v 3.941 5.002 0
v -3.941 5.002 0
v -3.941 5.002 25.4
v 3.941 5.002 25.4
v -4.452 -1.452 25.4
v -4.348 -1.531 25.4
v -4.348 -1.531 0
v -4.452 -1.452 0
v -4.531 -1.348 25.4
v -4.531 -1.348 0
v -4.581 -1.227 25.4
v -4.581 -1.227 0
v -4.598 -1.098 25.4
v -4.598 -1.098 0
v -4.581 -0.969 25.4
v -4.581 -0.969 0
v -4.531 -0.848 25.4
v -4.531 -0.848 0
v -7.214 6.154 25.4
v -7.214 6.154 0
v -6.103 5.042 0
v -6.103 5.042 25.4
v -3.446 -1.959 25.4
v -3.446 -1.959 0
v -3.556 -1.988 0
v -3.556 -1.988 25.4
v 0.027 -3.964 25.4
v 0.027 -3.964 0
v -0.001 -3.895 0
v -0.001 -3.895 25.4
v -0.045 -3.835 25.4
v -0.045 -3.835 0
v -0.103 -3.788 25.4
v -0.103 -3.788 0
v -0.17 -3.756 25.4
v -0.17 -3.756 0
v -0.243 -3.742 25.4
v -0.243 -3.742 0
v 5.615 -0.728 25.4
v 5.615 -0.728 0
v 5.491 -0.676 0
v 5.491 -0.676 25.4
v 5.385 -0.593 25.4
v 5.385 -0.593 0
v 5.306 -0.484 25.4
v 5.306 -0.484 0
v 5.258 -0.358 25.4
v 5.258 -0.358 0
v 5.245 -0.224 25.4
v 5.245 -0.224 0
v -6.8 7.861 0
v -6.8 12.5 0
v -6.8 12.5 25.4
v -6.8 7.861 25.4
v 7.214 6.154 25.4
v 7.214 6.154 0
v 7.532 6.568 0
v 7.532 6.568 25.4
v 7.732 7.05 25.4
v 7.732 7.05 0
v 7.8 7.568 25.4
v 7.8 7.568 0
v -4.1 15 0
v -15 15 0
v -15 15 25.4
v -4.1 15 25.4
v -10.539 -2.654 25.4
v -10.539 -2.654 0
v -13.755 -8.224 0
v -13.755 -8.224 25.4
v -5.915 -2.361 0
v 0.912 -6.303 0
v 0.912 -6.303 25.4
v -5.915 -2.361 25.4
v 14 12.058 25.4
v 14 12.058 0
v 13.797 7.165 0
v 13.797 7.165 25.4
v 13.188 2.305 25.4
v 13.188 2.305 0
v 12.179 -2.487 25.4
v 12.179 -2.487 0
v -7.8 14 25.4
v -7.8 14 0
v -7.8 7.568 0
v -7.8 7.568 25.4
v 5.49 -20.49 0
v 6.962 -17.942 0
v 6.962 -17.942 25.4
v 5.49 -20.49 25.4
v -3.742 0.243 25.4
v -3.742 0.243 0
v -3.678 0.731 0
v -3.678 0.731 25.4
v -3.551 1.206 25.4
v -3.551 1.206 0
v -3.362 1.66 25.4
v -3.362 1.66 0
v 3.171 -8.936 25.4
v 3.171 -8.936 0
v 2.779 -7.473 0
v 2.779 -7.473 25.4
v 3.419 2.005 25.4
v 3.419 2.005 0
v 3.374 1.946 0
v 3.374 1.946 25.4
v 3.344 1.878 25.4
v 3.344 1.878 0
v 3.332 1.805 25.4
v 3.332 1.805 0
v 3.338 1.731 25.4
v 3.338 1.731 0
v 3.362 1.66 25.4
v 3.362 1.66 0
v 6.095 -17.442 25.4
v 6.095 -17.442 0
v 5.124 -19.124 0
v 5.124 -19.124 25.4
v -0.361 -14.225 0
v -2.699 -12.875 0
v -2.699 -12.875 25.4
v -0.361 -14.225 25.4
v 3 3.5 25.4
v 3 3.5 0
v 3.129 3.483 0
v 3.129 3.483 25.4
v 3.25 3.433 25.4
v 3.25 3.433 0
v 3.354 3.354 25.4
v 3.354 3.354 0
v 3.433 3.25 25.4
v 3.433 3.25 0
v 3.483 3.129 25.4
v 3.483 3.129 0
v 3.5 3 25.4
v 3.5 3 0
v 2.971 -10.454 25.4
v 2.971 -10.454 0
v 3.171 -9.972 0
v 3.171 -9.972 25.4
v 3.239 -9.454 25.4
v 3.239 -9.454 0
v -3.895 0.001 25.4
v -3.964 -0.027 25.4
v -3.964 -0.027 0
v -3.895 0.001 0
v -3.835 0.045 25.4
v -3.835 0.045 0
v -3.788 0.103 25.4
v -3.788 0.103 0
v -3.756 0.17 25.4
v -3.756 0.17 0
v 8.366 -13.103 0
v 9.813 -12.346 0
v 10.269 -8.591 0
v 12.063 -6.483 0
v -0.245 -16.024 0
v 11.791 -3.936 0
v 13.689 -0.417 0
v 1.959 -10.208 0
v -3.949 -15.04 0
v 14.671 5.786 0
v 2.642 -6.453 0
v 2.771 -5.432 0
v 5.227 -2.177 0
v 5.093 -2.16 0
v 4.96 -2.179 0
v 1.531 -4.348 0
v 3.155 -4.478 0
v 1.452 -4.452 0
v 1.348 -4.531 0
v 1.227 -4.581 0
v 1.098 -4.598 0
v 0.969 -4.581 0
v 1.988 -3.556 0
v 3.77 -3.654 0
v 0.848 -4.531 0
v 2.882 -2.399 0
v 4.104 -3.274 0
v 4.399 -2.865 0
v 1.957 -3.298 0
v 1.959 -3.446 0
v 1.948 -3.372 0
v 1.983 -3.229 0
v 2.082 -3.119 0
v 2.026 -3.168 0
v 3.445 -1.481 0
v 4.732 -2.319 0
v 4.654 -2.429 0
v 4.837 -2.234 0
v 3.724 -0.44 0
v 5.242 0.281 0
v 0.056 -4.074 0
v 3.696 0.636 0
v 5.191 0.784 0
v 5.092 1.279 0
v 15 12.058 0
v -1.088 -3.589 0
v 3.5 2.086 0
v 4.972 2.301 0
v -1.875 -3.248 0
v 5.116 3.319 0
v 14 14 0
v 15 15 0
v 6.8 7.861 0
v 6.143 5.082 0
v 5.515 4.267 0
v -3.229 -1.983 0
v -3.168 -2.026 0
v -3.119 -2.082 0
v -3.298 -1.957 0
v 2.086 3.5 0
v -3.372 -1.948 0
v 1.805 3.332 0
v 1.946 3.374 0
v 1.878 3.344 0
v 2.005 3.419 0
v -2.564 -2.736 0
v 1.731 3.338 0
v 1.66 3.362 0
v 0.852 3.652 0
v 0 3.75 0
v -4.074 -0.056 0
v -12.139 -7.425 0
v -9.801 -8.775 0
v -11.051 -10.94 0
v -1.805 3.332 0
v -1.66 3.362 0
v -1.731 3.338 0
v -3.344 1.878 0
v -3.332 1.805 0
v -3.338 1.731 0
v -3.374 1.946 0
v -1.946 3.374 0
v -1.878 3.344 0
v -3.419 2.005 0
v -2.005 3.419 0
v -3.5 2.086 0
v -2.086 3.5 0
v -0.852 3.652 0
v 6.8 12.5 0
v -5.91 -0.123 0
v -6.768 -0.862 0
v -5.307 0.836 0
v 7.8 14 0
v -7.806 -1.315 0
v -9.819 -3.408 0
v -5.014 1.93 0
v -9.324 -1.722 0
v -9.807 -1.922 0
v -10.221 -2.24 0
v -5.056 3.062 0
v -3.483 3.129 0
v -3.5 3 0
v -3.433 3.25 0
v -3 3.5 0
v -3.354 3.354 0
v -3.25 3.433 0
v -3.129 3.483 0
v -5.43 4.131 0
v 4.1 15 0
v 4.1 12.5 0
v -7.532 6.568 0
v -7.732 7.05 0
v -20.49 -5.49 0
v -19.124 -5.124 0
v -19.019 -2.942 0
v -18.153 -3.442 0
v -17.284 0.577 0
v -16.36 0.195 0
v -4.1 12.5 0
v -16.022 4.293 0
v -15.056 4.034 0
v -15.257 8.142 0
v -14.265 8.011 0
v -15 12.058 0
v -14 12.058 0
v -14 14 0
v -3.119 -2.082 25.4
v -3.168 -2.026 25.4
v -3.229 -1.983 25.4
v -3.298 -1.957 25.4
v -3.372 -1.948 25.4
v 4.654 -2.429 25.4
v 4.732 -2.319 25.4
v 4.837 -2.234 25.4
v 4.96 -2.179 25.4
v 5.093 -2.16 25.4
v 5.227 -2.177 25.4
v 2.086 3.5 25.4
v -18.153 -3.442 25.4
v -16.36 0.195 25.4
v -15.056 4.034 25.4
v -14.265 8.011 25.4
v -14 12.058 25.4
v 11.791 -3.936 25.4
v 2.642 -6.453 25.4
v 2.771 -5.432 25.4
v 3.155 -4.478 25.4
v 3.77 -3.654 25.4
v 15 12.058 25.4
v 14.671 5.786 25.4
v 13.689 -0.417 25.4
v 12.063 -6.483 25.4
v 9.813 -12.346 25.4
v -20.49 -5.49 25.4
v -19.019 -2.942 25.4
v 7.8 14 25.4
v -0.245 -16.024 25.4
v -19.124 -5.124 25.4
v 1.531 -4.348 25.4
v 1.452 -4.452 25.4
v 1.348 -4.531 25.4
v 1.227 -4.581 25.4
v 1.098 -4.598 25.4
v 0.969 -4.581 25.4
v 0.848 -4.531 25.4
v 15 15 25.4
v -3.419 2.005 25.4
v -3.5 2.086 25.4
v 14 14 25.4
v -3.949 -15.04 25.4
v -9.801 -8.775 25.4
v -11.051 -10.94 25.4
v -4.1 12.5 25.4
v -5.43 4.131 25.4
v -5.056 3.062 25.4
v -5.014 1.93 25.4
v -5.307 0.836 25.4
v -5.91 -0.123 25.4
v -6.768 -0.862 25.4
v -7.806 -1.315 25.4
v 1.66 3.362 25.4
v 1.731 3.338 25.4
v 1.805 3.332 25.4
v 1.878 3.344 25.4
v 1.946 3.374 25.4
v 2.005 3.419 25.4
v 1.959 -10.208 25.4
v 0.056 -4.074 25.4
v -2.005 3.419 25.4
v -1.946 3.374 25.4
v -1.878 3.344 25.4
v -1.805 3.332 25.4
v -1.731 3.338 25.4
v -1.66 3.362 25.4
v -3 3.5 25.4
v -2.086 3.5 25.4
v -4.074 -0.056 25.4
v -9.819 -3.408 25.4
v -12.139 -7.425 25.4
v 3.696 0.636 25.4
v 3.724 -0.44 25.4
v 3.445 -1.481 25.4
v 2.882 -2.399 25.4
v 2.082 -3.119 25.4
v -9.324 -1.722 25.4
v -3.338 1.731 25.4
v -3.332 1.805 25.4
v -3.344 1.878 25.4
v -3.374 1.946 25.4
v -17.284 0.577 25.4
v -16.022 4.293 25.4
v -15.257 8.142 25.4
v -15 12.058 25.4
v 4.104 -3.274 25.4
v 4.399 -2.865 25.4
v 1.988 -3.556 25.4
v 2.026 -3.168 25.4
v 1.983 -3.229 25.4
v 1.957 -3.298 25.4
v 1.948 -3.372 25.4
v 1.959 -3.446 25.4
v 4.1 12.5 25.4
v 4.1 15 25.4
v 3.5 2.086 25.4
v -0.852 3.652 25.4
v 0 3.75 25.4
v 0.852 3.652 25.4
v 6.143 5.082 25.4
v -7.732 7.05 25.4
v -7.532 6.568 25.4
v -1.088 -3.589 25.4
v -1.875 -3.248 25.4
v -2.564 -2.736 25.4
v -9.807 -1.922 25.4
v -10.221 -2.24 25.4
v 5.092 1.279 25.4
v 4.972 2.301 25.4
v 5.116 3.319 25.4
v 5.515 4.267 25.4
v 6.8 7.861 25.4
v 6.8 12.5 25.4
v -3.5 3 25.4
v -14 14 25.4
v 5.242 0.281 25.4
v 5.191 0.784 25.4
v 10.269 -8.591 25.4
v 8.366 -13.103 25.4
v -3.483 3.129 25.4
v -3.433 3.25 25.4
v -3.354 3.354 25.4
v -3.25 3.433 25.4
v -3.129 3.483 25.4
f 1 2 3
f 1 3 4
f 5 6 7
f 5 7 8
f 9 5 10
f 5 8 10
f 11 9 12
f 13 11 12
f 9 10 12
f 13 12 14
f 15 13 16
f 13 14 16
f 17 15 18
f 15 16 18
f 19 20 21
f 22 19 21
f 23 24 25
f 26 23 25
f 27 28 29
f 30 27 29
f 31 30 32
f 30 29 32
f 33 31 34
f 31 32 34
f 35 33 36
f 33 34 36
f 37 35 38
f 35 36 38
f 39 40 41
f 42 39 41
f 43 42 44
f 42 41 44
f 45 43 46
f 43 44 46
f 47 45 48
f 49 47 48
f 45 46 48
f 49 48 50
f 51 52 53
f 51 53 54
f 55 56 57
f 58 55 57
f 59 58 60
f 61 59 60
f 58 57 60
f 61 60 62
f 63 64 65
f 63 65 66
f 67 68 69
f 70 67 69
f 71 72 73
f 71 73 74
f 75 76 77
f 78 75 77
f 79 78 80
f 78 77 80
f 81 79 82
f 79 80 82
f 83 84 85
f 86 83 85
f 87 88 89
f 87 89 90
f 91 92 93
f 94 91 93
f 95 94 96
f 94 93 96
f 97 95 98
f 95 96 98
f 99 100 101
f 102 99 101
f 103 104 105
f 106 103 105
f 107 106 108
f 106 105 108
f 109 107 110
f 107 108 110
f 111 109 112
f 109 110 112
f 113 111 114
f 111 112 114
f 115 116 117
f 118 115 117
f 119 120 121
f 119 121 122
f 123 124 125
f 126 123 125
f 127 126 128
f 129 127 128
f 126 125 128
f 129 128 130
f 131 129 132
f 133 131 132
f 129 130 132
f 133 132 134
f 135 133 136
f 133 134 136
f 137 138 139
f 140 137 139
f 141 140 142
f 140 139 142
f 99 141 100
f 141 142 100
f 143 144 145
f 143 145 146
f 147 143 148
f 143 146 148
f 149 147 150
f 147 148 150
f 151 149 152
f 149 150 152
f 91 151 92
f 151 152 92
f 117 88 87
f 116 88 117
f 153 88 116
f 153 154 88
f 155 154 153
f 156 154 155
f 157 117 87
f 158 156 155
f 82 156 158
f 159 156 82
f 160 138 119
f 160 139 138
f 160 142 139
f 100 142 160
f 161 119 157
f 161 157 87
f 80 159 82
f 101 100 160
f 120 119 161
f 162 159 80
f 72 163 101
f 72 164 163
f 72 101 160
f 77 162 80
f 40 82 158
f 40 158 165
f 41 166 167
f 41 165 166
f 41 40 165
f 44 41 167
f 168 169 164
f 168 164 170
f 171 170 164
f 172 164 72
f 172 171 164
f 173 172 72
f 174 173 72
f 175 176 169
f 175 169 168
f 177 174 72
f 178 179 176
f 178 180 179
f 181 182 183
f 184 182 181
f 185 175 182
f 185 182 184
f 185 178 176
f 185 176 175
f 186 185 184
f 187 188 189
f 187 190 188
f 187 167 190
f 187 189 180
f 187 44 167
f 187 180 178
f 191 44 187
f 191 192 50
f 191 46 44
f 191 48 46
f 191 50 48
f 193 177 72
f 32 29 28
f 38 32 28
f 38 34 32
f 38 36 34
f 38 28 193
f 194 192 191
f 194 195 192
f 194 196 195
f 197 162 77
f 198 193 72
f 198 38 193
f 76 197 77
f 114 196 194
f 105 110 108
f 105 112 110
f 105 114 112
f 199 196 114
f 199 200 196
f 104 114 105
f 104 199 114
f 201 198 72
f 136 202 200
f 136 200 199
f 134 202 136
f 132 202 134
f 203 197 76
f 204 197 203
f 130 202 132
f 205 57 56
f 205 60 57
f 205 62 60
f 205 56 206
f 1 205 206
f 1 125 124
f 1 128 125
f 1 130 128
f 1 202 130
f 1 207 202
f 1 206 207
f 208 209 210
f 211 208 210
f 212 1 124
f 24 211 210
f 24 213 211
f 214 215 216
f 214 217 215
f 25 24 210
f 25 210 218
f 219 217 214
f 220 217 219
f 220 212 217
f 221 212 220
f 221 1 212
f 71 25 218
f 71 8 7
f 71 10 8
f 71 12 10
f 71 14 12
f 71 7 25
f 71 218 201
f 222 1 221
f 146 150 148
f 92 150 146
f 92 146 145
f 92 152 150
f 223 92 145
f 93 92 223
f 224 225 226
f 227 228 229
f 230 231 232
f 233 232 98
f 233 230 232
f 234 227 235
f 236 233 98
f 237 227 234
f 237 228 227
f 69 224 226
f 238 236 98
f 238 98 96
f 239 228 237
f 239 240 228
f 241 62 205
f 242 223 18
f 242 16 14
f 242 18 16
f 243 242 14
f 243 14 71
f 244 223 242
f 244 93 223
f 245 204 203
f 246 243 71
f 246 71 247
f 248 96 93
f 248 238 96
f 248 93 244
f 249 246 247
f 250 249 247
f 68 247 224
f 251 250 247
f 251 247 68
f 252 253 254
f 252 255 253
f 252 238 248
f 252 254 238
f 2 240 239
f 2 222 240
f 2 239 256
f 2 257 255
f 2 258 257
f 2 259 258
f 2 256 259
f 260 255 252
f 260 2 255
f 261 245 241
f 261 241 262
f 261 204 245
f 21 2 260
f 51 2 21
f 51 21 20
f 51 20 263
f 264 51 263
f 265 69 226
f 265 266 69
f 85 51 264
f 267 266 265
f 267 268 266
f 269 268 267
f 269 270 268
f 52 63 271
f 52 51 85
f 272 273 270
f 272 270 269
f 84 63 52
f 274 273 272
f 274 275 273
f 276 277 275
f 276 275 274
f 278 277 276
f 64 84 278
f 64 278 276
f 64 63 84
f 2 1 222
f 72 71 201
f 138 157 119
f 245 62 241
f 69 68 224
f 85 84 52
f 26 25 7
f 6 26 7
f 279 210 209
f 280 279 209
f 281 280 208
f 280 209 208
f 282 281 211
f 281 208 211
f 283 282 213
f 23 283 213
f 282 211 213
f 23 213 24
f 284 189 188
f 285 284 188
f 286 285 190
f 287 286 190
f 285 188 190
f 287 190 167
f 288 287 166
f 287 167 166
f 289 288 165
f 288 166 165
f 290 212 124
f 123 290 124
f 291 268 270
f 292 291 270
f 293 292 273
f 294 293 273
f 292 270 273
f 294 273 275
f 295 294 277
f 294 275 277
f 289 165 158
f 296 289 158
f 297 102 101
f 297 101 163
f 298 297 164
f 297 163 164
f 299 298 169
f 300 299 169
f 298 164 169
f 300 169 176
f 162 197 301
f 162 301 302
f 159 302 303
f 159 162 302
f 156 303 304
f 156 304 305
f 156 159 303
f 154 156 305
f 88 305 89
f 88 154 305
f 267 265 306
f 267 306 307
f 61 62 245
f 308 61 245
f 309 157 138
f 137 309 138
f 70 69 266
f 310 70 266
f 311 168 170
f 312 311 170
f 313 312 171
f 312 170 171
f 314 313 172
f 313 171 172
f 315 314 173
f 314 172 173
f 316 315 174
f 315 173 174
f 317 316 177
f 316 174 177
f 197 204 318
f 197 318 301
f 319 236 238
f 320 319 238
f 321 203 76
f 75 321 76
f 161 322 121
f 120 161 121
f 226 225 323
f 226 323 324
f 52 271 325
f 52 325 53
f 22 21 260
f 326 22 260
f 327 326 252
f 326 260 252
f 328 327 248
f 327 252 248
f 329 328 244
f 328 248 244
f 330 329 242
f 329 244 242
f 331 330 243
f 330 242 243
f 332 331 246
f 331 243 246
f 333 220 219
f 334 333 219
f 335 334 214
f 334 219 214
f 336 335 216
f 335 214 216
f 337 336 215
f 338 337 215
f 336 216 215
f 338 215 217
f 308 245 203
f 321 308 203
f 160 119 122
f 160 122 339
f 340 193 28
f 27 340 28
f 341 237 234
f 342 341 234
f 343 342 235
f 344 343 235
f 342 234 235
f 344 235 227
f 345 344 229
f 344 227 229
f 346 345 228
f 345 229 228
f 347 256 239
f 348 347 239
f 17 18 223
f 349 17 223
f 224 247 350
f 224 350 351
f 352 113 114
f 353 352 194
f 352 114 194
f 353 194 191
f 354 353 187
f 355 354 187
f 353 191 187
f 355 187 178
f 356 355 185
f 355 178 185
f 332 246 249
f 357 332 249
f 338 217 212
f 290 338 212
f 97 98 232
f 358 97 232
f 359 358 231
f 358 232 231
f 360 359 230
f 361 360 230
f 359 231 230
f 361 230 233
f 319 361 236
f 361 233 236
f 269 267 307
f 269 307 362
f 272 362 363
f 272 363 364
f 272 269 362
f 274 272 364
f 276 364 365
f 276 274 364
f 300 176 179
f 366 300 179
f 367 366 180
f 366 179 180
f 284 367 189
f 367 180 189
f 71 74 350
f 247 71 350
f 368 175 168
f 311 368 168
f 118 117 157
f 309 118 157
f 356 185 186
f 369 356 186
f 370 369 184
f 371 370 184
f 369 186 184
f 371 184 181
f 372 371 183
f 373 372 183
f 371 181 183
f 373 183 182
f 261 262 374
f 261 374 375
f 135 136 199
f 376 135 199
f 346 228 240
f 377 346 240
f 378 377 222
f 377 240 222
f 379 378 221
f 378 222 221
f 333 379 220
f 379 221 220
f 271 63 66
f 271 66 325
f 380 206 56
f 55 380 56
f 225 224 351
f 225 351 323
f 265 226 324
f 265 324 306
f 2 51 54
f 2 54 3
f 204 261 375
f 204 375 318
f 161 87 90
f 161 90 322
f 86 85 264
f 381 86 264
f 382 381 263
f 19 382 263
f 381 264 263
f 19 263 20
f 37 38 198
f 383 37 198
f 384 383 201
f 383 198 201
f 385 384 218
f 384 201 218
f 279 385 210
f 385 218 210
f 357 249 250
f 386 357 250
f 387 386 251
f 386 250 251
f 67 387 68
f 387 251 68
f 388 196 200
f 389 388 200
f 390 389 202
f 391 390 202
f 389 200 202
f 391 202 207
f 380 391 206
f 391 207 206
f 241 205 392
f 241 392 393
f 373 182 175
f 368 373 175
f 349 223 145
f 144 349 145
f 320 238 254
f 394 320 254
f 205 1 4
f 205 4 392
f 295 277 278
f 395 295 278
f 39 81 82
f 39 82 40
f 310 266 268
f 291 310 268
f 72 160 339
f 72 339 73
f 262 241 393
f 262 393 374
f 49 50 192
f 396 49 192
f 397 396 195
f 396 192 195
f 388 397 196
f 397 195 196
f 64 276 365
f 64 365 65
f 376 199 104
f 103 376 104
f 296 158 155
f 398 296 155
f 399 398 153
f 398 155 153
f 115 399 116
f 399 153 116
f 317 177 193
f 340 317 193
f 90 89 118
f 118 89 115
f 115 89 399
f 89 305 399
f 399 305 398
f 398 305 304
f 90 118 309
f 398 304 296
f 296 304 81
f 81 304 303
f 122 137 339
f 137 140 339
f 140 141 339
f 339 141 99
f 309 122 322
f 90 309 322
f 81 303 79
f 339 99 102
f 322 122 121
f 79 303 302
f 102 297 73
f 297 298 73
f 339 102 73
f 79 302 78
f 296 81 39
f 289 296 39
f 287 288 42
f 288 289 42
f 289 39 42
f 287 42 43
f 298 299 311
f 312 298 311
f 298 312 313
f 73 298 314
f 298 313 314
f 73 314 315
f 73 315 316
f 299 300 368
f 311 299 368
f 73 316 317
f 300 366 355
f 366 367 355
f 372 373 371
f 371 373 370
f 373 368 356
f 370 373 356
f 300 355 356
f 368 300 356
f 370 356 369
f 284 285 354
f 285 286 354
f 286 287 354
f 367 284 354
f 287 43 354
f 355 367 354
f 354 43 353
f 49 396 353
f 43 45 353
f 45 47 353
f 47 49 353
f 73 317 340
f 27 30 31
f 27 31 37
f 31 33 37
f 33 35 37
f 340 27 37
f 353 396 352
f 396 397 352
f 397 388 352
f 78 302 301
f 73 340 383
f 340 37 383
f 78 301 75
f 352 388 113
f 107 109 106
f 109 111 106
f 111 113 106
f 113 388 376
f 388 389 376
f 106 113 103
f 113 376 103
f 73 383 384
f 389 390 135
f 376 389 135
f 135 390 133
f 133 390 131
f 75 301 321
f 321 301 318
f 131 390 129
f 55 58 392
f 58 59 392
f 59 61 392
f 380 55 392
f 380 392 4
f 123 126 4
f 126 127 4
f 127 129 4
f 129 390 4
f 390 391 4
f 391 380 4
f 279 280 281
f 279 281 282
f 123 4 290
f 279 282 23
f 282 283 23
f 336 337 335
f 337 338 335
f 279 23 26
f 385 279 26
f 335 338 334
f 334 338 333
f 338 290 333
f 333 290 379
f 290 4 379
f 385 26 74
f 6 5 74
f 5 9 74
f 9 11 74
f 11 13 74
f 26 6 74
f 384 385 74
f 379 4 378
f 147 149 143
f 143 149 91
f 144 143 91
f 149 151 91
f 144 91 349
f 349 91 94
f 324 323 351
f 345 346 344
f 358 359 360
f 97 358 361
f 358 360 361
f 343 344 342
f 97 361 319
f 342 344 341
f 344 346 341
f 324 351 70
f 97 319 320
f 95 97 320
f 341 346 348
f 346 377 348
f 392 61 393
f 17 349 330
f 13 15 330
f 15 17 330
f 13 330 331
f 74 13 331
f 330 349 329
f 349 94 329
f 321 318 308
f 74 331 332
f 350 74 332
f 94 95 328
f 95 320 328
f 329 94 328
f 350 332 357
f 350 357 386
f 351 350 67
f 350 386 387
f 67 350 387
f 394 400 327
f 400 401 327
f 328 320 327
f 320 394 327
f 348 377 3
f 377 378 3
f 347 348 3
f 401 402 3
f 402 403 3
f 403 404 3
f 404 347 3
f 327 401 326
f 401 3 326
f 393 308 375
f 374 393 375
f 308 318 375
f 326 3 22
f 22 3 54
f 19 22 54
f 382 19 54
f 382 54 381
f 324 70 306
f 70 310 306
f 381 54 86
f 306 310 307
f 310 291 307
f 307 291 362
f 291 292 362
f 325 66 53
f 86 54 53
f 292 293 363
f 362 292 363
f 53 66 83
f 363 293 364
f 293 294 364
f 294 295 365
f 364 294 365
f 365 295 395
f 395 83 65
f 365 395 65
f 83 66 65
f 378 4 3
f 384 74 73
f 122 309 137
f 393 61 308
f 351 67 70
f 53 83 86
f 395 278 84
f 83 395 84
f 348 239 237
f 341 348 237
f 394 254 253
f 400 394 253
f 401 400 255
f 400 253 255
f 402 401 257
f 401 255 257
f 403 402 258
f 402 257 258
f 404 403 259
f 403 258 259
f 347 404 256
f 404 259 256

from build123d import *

# Parameters (mm, degrees)
EXTRUSION4_DEPTH = 25.4


with BuildPart() as part:
    # Sketch1 → Extrusion4 (new body)
    with BuildSketch(Plane.XY):
        with BuildLine():
            Line((-14.999999544, 15.00000004), (-4.099998054, 15.00000004))
            Line((-4.099998054, 15.00000004), (-4.099998054, 12.50000004))
            Line((-4.099998054, 12.50000004), (-6.799995004, 12.50000004))
            Line((-6.799995004, 12.50000004), (-6.799995004, 7.86065564))
            Line((-6.799995004, 7.86065564), (-3.941497574, 5.00215821))
            Line((-3.941497574, 5.00215821), (3.941498416, 5.00215821))
            Line((3.941498416, 5.00215821), (6.799995846, 7.86065564))
            Line((6.799995846, 7.86065564), (6.799995846, 12.50000004))
            Line((6.799995846, 12.50000004), (4.099998896, 12.50000004))
            Line((4.099998896, 12.50000004), (4.099998896, 15.00000004))
            Line((4.099998896, 15.00000004), (15.000000416, 15.00000004))
            Line((15.000000416, 15.00000004), (15.000000416, 12.05771371))
            ThreePointArc((15.000000416, 12.05771371), (12.955549997, -3.471428997), (6.961524646, -17.94228629))
            Line((6.961524646, -17.94228629), (5.490381513, -20.490381017))
            Line((5.490381513, -20.490381017), (-3.949296731, -15.040380238))
            Line((-3.949296731, -15.040380238), (-2.699296736, -12.875316731))
            Line((-2.699296736, -12.875316731), (-0.361030787, -14.225315201))
            Line((-0.361030787, -14.225315201), (1.958641406, -10.2075251))
            Line((1.958641406, -10.2075251), (0.912358736, -6.302745))
            Line((0.912358736, -6.302745), (-5.914516044, -2.36124701))
            Line((-5.914516044, -2.36124701), (-9.819296144, -3.40752968))
            Line((-9.819296144, -3.40752968), (-12.138968342, -7.425319789))
            Line((-12.138968342, -7.425319789), (-9.800702394, -8.775318258))
            Line((-9.800702394, -8.775318258), (-11.050702387, -10.940381761))
            Line((-11.050702387, -10.940381761), (-20.490380619, -5.490380991))
            Line((-20.490380619, -5.490380991), (-19.019237434, -2.94228629))
            ThreePointArc((-19.019237434, -2.94228629), (-16.022224761, 4.293142357), (-14.999999544, 12.05771371))
            Line((-14.999999544, 12.05771371), (-14.999999544, 15.00000004))
        make_face()
        with BuildLine():
            Line((-3.499999544, 2.08578648), (-3.499999544, 3.00000004))
            ThreePointArc((-3.499999544, 3.00000004), (-3.353552934, 3.35355343), (-2.999999544, 3.50000004))
            Line((-2.999999544, 3.50000004), (-2.085785994, 3.50000006))
            Line((-2.085785994, 3.50000006), (-2.005133554, 3.41934762))
            ThreePointArc((-2.005133554, 3.41934762), (-1.841799553, 3.33547501), (-1.660186564, 3.36248117))
            ThreePointArc((-1.660186564, 3.36248117), (4.31e-07, 3.75000007), (1.660187426, 3.36248117))
            ThreePointArc((1.660187426, 3.36248117), (1.841800416, 3.33547501), (2.005134416, 3.41934762))
            Line((2.005134416, 3.41934762), (2.085786856, 3.50000006))
            Line((2.085786856, 3.50000006), (3.000000416, 3.50000006))
            ThreePointArc((3.000000416, 3.50000006), (3.353553806, 3.35355345), (3.500000416, 3.00000006))
            Line((3.500000416, 3.00000006), (3.500000416, 2.0857865))
            Line((3.500000416, 2.0857865), (3.419347976, 2.00513406))
            ThreePointArc((3.419347976, 2.00513406), (3.335475366, 1.841800059), (3.362481526, 1.66018707))
            ThreePointArc((3.362481526, 1.66018707), (3.622222275, -0.970571346), (2.081900986, -3.11900459))
            ThreePointArc((2.081900986, -3.11900459), (1.967706477, -3.262782979), (1.958675286, -3.44617068))
            Line((1.958675286, -3.44617068), (1.988196126, -3.55634396))
            Line((1.988196126, -3.55634396), (1.531089346, -4.34807613))
            ThreePointArc((1.531089346, -4.34807613), (1.227486167, -4.58103904), (0.848076646, -4.53108883))
            Line((0.848076646, -4.53108883), (0.056344476, -4.07398205))
            Line((0.056344476, -4.07398205), (0.026823636, -3.96380877))
            ThreePointArc((0.026823636, -3.96380877), (-0.072691445, -3.809505949), (-0.243475994, -3.74208748))
            ThreePointArc((-0.243475994, -3.74208748), (-1.874999553, -3.247595194), (-3.119004214, -2.08190049))
            ThreePointArc((-3.119004214, -2.08190049), (-3.262782603, -1.967705981), (-3.446170304, -1.95867479))
            Line((-3.446170304, -1.95867479), (-3.556343584, -1.98819563))
            Line((-3.556343584, -1.98819563), (-4.348075754, -1.53108885))
            ThreePointArc((-4.348075754, -1.53108885), (-4.581038663, -1.227485671), (-4.531088454, -0.84807615))
            Line((-4.531088454, -0.84807615), (-4.073981674, -0.05634398))
            Line((-4.073981674, -0.05634398), (-3.963808394, -0.02682314))
            ThreePointArc((-3.963808394, -0.02682314), (-3.809505572, 0.072691941), (-3.742087104, 0.24347649))
            ThreePointArc((-3.742087104, 0.24347649), (-3.622221403, 0.970571473), (-3.362480654, 1.66018705))
            ThreePointArc((-3.362480654, 1.66018705), (-3.335474493, 1.841800039), (-3.419347104, 2.00513404))
            Line((-3.419347104, 2.00513404), (-3.499999544, 2.08578648))
        make_face(mode=Mode.SUBTRACT)
        with BuildLine():
            Line((7.799995876, 7.56776241), (7.799995866, 14.00000004))
            Line((7.799995866, 14.00000004), (14.000000436, 14.00000004))
            Line((14.000000436, 14.00000004), (14.000000436, 12.05771371))
            ThreePointArc((14.000000436, 12.05771371), (13.543013967, 4.72862326), (12.179133767, -2.486931761))
            Line((12.179133767, -2.486931761), (5.615359986, -0.72817388))
            ThreePointArc((5.615359986, -0.72817388), (5.341691374, -0.541062306), (5.245224376, -0.22388827))
            ThreePointArc((5.245224376, -0.22388827), (5.222856323, 0.533175972), (5.091787186, 1.27914345))
            ThreePointArc((5.091787186, 1.27914345), (5.115773337, 3.319255981), (6.142816616, 5.08215603))
            Line((6.142816616, 5.08215603), (7.214209436, 6.15354885))
            ThreePointArc((7.214209436, 6.15354885), (7.647754936, 6.802395548), (7.799995876, 7.56776241))
        make_face(mode=Mode.SUBTRACT)
        with BuildLine():
            Line((5.227131414, -2.177062614), (11.790905183, -3.935820492))
            ThreePointArc((11.790905183, -3.935820492), (9.364282579, -10.866614542), (6.095499246, -17.44228629))
            Line((6.095499246, -17.44228629), (5.124356099, -19.124355612))
            Line((5.124356099, -19.124355612), (-0.245005373, -16.024353311))
            Line((-0.245005373, -16.024353311), (2.971113436, -10.45387213))
            ThreePointArc((2.971113436, -10.45387213), (3.221952356, -9.714924516), (3.170914286, -8.93623404))
            Line((3.170914286, -8.93623404), (2.778757296, -7.47268423))
            ThreePointArc((2.778757296, -7.47268423), (2.770761748, -5.432446365), (3.770045396, -3.65366401))
            ThreePointArc((3.770045396, -3.65366401), (4.256538339, -3.07317179), (4.654441766, -2.42871895))
            ThreePointArc((4.654441766, -2.42871895), (4.896571658, -2.202271683), (5.227131414, -2.177062614))
        make_face(mode=Mode.SUBTRACT)
        with BuildLine():
            Line((-13.999999544, 14.00000005), (-7.799994974, 14.00000005))
            Line((-7.799994974, 14.00000005), (-7.799994974, 7.56776243))
            ThreePointArc((-7.799994974, 7.56776243), (-7.647754043, 6.802395559), (-7.214208534, 6.15354886))
            Line((-7.214208534, 6.15354886), (-6.102918804, 5.04225913))
            ThreePointArc((-6.102918804, 5.04225913), (-5.119406434, 1.371740988), (-7.806412204, -1.31526478))
            Line((-7.806412204, -1.31526478), (-9.324462204, -1.72202505))
            ThreePointArc((-9.324462204, -1.72202505), (-10.024346973, -2.06717002), (-10.538874924, -2.6538767))
            Line((-10.538874924, -2.6538767), (-13.754993733, -8.224357881))
            Line((-13.754993733, -8.224357881), (-19.124355202, -5.12435558))
            Line((-19.124355202, -5.12435558), (-18.153212024, -3.44228628))
            ThreePointArc((-18.153212024, -3.44228628), (-15.056298932, 4.034323322), (-13.999999544, 12.05771372))
            Line((-13.999999544, 12.05771372), (-13.999999544, 14.00000005))
        make_face(mode=Mode.SUBTRACT)
    extrude(amount=EXTRUSION4_DEPTH)


solid = part.part
